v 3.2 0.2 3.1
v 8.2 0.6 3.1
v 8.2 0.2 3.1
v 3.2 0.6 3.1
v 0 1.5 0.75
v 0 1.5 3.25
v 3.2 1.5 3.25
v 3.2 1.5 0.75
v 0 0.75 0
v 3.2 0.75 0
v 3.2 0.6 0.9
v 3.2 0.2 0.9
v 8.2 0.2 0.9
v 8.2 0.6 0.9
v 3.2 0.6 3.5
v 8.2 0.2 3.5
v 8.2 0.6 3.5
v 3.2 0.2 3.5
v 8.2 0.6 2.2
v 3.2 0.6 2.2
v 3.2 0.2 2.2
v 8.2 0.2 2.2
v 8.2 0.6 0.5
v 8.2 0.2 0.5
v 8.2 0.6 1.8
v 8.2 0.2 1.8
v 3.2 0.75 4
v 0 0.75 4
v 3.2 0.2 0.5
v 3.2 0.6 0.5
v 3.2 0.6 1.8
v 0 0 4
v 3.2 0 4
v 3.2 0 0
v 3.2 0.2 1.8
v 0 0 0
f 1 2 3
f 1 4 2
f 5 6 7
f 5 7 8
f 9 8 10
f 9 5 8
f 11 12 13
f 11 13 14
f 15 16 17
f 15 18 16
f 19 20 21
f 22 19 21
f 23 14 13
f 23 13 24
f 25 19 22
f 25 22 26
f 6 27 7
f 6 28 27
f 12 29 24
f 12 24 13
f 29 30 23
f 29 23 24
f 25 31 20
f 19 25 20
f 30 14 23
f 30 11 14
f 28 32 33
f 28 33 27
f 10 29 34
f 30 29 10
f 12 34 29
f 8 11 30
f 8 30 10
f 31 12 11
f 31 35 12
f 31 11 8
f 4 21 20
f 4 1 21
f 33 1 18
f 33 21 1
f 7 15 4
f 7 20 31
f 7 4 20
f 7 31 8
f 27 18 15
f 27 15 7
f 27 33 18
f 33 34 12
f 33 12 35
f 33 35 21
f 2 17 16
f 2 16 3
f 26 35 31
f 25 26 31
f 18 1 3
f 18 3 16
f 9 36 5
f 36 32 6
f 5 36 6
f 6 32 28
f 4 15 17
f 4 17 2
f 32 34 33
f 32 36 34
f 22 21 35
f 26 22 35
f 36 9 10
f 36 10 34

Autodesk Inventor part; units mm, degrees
ref_plane "YZ Plane" through (0, 0, 0) normal (1, 0, 0) x (0, 1, 0)
ref_plane "XZ Plane" through (0, 0, 0) normal (0, 1, 0) x (-1, 0, 0)
ref_plane "XY Plane" through (0, 0, 0) normal (0, 0, 1) x (1, 0, 0)
sketch "Skizze1" plane through (0, 0, 0) normal (1, 0, 0) x (0, 1, 0)
  line L0 (0, 0) -> (0, 4)
  line L1 (0, 4) -> (0.75, 4)
  line L2 (0.75, 4) -> (1.5, 3.25)
  line L3 (1.5, 3.25) -> (1.5, 0.75)
  line L4 (1.5, 0.75) -> (0.75, 0)
  line L5 (0.75, 0) -> (0, 0)
  point P0 (1.5, 2)
  point P1 (0, 2)
  dimension "d0" = 4
  dimension "d1" = 1.5
  dimension "d2" = 0.75
  dimension "d3" = 45
extrude "Extrusion1" add sketch "Skizze1" along normal blind 3.2
sketch "Skizze2" plane through (3.2, 0, 0) normal (1, 0, 0) x (0, 0, -1)
  line L0 (-3.1, 0.2) -> (-3.5, 0.2)
  line L1 (-3.5, 0.2) -> (-3.5, 0.6)
  line L2 (-3.5, 0.6) -> (-3.1, 0.6)
  line L3 (-3.1, 0.6) -> (-3.1, 0.2)
  line L4 (-1.8, 0.6) -> (-2.2, 0.6)
  line L5 (-2.2, 0.6) -> (-2.2, 0.2)
  line L6 (-2.2, 0.2) -> (-1.8, 0.2)
  line L7 (-1.8, 0.2) -> (-1.8, 0.6)
  line L8 (-0.9, 0.6) -> (-0.5, 0.6)
  line L9 (-0.5, 0.6) -> (-0.5, 0.2)
  line L10 (-0.5, 0.2) -> (-0.9, 0.2)
  line L11 (-0.9, 0.2) -> (-0.9, 0.6)
  line L12 (-3.5, 0.4) -> (-0.5, 0.4) construction
  line L13 (-0.75, 1.5) -> (-3.25, 1.5) projected
  point P0 (0, 0)
  point P1 (-2, 0.4)
  point P2 (-2, 0.6)
  point P3 (-2.2, 0.4)
  point P4 (-2, 1.5)
  dimension "d6" = 0.4
  dimension "d7" = 3
  dimension "d8" = 0.9
extrude "Extrusion2" add sketch "Skizze2" along normal blind 5
properties part number "08-04-02-008_hallSensor" material "ABS-Kunststoff(1)"
